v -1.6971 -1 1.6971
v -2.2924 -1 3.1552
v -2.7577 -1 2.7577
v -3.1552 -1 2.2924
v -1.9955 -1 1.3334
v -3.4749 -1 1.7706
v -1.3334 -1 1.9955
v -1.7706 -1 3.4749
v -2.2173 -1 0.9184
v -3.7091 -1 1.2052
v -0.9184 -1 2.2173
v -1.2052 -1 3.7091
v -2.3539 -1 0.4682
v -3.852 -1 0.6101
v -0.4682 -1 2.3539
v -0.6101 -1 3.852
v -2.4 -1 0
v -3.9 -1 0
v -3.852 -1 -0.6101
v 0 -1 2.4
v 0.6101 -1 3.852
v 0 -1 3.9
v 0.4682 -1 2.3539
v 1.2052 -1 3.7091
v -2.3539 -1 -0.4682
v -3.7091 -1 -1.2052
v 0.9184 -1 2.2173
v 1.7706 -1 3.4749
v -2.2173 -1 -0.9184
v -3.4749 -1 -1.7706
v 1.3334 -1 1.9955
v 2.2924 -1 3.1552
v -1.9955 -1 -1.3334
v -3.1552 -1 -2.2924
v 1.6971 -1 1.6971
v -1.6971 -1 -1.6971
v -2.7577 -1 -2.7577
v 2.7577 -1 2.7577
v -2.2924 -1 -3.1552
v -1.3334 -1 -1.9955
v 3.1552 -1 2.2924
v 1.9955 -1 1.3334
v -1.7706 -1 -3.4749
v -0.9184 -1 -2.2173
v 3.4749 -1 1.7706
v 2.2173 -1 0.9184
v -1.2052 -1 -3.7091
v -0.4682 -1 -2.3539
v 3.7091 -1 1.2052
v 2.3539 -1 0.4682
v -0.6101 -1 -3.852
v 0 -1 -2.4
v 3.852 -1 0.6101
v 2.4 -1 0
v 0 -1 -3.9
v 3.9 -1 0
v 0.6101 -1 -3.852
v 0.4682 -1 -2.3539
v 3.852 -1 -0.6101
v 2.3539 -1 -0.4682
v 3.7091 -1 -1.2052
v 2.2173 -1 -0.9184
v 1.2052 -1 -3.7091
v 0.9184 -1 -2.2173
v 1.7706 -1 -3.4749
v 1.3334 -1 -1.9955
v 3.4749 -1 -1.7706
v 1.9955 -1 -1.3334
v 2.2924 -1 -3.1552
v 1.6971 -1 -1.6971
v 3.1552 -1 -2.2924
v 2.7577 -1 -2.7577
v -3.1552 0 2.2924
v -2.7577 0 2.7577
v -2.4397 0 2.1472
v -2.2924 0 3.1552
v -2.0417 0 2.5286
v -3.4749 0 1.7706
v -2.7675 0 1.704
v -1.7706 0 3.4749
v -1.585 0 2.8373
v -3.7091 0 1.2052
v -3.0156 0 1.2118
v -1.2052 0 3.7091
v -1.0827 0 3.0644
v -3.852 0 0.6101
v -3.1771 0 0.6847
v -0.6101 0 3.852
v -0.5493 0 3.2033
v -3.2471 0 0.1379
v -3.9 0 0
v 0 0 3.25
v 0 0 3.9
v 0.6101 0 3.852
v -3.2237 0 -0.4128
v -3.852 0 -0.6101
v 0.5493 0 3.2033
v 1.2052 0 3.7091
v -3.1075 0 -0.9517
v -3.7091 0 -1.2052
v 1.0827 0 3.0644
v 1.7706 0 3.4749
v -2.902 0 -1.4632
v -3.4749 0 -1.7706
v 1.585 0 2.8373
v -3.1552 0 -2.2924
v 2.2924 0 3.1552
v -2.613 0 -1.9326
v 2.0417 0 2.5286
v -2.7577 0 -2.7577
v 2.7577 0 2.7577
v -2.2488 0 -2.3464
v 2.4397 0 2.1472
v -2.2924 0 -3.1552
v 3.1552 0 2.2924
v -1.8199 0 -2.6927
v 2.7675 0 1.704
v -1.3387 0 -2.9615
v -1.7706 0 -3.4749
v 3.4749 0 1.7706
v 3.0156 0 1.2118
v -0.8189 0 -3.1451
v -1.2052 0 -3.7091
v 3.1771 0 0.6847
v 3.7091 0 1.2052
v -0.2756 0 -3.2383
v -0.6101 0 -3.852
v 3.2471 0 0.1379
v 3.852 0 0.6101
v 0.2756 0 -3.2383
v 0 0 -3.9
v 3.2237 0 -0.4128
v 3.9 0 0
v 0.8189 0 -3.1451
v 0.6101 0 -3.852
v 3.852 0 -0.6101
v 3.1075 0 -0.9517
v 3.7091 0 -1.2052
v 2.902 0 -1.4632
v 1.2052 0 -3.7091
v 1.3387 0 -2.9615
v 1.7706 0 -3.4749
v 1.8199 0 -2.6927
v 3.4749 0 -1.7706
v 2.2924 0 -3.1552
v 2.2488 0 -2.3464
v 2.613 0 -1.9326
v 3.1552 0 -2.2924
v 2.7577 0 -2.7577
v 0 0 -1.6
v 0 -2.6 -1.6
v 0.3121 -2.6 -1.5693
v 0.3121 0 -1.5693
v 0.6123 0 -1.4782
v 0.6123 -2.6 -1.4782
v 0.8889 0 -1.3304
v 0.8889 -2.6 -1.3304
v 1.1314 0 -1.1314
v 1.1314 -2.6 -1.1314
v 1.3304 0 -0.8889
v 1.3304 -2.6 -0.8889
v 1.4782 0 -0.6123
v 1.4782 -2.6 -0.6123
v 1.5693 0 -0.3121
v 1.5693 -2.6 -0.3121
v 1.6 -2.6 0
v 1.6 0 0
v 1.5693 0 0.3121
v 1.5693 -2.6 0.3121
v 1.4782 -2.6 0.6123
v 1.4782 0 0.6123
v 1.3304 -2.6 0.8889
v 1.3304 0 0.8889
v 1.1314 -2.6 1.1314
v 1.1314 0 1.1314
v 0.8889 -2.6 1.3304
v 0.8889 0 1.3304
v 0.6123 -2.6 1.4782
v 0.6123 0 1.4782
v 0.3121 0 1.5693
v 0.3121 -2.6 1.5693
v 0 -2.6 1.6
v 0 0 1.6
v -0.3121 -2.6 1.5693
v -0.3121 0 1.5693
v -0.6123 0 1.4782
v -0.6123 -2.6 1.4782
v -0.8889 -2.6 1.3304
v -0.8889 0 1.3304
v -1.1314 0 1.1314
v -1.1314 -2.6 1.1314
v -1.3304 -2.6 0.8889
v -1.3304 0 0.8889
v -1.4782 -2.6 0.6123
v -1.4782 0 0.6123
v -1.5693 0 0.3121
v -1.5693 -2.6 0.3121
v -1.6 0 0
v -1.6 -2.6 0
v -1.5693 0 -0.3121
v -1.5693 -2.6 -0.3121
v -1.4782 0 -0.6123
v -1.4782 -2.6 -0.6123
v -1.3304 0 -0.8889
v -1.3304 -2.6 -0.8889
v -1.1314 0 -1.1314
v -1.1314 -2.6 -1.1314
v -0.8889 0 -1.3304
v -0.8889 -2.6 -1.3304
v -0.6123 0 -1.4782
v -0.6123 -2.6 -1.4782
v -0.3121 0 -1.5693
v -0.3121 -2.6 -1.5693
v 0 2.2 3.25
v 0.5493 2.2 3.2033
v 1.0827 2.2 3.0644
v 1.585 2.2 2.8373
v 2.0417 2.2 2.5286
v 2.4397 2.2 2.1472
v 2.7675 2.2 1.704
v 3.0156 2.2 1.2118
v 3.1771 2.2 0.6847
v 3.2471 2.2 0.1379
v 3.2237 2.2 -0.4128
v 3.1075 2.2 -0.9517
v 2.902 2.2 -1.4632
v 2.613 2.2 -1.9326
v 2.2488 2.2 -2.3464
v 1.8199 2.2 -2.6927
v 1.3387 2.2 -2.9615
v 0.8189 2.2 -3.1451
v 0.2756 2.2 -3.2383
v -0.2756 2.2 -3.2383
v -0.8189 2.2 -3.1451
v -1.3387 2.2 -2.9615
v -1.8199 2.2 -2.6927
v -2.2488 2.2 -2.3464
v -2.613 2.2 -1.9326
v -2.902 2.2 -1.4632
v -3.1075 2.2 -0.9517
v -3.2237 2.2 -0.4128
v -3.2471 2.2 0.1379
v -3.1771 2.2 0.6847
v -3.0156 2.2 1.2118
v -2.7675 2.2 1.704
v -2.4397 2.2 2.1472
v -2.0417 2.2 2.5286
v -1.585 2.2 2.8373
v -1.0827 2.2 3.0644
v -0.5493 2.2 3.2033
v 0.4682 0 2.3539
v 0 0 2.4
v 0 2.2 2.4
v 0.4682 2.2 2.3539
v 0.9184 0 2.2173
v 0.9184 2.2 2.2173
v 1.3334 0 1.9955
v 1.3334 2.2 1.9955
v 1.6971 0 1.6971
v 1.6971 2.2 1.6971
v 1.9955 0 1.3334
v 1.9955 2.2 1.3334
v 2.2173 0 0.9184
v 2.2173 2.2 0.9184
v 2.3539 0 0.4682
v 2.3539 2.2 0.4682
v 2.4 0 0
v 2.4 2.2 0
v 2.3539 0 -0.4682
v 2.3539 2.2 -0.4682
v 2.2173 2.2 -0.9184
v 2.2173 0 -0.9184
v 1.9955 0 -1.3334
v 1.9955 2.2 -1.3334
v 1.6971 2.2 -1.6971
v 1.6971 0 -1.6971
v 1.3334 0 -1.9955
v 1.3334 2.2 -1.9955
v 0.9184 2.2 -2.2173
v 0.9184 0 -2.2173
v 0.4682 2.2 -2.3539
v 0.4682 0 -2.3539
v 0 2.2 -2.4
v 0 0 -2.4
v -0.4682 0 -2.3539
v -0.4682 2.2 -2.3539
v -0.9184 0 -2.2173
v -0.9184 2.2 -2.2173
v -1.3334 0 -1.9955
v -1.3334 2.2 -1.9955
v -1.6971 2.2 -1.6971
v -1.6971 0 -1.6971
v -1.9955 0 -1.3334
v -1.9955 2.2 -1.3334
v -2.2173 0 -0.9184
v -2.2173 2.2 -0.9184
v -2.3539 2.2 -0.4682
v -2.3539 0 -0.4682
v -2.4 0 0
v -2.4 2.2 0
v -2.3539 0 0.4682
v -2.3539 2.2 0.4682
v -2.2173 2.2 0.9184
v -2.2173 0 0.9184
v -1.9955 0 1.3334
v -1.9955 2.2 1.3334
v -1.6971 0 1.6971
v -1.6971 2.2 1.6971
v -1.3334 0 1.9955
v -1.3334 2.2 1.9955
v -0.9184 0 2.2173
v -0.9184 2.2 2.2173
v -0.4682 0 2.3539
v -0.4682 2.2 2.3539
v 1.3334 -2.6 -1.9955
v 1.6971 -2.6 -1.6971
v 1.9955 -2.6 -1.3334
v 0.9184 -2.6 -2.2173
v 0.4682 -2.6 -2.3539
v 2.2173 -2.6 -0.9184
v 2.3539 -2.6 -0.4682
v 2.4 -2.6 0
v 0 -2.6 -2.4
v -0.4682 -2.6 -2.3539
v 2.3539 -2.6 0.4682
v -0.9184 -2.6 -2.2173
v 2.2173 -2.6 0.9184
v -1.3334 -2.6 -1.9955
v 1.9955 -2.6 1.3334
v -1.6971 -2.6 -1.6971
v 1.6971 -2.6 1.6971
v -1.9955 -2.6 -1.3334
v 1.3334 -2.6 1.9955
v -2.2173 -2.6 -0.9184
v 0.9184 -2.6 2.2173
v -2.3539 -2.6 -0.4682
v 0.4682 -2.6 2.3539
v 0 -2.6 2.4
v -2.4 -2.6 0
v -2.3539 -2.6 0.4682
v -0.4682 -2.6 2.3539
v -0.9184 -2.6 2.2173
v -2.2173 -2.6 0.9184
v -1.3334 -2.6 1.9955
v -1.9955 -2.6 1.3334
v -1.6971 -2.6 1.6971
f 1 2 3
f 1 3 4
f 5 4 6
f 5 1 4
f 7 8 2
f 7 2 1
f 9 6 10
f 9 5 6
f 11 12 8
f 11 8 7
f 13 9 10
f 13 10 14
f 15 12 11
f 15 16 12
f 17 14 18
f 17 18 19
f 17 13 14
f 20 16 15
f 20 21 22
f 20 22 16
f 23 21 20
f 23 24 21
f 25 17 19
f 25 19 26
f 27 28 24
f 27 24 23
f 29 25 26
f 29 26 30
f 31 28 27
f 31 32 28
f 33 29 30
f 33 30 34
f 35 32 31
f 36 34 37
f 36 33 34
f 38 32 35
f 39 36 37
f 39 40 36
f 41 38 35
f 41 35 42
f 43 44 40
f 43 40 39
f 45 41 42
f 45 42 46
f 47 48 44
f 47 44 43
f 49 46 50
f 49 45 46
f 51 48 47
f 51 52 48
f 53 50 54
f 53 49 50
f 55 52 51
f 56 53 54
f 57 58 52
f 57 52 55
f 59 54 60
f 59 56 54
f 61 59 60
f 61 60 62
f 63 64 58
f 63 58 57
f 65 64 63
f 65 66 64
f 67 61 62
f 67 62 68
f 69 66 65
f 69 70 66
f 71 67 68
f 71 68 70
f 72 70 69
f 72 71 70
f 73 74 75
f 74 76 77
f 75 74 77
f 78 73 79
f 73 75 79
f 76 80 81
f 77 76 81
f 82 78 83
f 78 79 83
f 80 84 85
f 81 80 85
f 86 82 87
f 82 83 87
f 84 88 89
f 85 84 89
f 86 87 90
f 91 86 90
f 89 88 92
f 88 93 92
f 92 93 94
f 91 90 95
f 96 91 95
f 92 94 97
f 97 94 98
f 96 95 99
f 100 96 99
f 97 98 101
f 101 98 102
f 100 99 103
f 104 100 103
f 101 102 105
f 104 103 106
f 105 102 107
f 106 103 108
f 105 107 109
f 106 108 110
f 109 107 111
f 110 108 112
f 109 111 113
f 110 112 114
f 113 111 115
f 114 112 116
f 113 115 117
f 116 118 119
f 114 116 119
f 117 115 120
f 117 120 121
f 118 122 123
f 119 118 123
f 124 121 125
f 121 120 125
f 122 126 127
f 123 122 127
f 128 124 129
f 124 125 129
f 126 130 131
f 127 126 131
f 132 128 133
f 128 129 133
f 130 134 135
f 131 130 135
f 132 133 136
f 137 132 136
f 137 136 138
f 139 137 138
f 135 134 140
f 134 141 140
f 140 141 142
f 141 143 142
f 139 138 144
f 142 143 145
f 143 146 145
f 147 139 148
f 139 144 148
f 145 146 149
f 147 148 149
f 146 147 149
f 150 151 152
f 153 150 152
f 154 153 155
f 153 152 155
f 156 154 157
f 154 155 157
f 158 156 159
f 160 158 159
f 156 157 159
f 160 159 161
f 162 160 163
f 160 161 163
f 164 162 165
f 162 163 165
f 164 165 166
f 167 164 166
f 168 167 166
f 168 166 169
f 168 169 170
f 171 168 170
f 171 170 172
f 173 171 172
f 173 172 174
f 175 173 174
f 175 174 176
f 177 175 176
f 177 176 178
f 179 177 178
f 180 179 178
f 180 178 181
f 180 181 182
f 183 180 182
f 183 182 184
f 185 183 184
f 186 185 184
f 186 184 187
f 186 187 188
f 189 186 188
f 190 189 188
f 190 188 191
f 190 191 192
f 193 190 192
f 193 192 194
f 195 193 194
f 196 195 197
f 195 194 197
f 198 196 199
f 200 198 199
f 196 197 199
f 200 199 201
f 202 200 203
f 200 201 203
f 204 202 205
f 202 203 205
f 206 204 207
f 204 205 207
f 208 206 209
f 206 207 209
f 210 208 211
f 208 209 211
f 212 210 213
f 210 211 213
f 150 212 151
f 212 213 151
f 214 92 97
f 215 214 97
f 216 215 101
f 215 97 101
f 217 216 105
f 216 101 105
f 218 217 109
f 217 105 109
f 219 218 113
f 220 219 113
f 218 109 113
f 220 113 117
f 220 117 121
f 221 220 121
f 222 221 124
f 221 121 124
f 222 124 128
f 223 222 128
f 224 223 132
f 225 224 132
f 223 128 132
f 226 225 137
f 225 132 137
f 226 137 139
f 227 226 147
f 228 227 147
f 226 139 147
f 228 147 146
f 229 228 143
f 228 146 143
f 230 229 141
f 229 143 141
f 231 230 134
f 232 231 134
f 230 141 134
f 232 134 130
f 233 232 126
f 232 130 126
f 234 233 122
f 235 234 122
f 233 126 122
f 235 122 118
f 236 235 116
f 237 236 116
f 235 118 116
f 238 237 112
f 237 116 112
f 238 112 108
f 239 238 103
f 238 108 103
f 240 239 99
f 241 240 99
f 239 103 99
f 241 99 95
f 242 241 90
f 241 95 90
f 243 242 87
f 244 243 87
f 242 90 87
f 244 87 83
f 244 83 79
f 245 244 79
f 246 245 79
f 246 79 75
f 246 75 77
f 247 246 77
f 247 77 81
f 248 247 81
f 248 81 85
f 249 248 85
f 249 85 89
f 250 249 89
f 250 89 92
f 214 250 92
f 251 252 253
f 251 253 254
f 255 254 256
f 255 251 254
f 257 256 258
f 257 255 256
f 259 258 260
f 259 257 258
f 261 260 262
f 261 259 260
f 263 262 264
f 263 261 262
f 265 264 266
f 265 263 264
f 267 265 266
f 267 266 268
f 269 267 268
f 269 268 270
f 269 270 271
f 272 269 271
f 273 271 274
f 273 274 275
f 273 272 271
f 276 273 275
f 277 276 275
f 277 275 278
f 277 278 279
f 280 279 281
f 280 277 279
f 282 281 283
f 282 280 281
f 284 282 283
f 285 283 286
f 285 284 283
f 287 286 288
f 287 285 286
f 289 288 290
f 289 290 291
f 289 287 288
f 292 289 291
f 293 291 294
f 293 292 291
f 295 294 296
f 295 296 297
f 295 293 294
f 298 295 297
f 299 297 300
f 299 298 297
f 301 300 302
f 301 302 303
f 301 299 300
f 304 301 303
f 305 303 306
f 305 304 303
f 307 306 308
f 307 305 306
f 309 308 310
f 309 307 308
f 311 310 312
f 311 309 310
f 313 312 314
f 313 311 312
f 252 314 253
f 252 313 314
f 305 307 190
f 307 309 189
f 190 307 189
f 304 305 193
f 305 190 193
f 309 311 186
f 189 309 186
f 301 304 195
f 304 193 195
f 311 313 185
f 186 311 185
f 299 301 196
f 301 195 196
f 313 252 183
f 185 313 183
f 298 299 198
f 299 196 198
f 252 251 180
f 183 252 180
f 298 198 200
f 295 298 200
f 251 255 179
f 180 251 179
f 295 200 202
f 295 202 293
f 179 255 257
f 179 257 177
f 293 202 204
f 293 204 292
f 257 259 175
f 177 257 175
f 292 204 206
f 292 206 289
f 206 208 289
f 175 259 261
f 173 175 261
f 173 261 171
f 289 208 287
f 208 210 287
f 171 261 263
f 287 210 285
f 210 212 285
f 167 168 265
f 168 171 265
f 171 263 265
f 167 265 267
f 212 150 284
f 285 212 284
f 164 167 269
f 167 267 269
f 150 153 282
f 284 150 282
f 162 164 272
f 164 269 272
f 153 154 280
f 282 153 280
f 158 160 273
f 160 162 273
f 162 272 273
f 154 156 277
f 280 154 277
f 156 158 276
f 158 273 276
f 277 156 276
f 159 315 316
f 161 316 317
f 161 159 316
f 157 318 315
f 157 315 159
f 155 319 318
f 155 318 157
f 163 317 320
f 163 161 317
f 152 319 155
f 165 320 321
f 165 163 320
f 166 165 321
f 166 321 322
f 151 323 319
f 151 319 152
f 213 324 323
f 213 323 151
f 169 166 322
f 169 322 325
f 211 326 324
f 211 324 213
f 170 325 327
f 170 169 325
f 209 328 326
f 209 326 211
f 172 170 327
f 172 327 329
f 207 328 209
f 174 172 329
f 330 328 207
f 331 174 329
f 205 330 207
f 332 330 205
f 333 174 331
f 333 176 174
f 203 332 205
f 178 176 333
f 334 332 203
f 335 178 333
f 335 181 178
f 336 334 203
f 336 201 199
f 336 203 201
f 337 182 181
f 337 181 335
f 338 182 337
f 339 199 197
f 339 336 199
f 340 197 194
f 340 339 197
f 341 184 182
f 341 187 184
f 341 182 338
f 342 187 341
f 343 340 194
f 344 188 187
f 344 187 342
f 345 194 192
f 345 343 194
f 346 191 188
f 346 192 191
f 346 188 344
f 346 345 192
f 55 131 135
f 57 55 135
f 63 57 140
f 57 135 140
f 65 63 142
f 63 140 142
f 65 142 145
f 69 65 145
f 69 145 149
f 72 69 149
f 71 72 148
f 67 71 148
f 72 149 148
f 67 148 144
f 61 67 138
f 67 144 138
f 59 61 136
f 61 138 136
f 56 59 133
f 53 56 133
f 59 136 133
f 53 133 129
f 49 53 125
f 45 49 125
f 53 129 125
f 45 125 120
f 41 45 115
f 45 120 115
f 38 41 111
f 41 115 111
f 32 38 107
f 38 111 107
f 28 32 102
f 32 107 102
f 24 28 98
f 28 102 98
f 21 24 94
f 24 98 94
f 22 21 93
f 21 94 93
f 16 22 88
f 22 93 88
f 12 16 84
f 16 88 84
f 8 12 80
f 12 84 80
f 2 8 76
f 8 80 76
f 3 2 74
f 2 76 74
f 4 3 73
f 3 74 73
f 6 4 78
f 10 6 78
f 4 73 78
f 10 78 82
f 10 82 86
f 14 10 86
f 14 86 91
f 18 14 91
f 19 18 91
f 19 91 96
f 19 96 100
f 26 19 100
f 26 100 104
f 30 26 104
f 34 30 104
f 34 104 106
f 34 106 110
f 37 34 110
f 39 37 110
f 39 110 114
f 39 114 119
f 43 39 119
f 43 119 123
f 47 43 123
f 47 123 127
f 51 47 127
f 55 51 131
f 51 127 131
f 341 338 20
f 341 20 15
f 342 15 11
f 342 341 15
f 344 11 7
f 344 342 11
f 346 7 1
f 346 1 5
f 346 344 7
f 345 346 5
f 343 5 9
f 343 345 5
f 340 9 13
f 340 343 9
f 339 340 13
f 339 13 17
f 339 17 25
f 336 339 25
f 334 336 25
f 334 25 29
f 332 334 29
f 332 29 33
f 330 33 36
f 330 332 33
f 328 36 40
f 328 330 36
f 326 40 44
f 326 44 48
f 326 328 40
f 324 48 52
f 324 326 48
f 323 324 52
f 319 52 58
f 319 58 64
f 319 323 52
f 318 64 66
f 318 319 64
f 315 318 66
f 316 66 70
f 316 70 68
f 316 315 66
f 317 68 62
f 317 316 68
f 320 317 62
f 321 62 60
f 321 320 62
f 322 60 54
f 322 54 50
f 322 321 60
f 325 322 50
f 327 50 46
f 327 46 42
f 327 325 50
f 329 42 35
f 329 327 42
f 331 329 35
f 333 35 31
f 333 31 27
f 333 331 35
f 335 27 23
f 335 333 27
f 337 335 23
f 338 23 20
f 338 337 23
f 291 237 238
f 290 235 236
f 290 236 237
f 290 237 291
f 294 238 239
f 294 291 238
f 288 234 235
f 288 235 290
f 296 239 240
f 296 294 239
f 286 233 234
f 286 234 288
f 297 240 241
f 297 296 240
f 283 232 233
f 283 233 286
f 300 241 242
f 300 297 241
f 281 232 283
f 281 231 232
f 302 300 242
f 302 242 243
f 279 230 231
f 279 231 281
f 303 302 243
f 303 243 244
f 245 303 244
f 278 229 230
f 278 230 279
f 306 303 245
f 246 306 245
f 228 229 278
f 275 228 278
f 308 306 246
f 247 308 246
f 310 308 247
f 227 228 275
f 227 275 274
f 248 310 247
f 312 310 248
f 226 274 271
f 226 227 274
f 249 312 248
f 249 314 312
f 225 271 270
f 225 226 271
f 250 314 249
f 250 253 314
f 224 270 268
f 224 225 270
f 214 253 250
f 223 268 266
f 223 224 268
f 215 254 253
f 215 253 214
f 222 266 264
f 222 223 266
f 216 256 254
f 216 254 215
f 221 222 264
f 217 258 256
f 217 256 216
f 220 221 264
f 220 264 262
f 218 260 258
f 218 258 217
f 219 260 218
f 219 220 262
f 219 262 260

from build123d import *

# Parameters (mm, degrees)
SKETCH1_R           = 3.25
SKETCH1_R_2         = 2.4
BOSS_EXTRUDE1_DEPTH = 2.2
SKETCH2_R           = 3.9
BOSS_EXTRUDE2_DEPTH = 1
BOSS_EXTRUDE3_START = 1.6
SKETCH3_R           = 2.4
SKETCH3_R_2         = 1.6
BOSS_EXTRUDE3_DEPTH = 1.6
SKETCH4_R           = 1.6
CUT_EXTRUDE1_DEPTH  = 7.376519427


with BuildPart() as part:
    # Sketch1 → Boss-Extrude1 (new body)
    with BuildSketch(Plane(origin=(0, 0, 0), x_dir=(1, 0, 0), z_dir=(0, 1, 0))):
        with Locations(Location((0, 0, 0), (0, 0, 270))):
            Circle(SKETCH1_R)
        with Locations(Location((0, 0, 0), (0, 0, 270))):
            Circle(SKETCH1_R_2, mode=Mode.SUBTRACT)
    extrude(amount=BOSS_EXTRUDE1_DEPTH)

    # Sketch2 → Boss-Extrude2 (add)
    with BuildSketch(Plane.XZ):
        with Locations(Location((0, 0, 0), (0, 0, 270))):
            Circle(SKETCH2_R)
    extrude(amount=BOSS_EXTRUDE2_DEPTH)

    # Sketch3 → Boss-Extrude3 (add)
    with BuildSketch(Plane.XZ.offset(1).offset(BOSS_EXTRUDE3_START)):
        with Locations(Location((0, 0, 0), (0, 0, 90))):
            Circle(SKETCH3_R)
        with Locations(Location((0, 0, 0), (0, 0, 270))):
            Circle(SKETCH3_R_2, mode=Mode.SUBTRACT)
    extrude(amount=-BOSS_EXTRUDE3_DEPTH)

    # Sketch4 → Cut-Extrude1 (cut, through all)
    with BuildSketch(Plane.XZ.offset(1)):
        with Locations(Location((0, 0, 0), (0, 0, 270))):
            Circle(SKETCH4_R)
    extrude(amount=-CUT_EXTRUDE1_DEPTH, mode=Mode.SUBTRACT)


solid = part.part
